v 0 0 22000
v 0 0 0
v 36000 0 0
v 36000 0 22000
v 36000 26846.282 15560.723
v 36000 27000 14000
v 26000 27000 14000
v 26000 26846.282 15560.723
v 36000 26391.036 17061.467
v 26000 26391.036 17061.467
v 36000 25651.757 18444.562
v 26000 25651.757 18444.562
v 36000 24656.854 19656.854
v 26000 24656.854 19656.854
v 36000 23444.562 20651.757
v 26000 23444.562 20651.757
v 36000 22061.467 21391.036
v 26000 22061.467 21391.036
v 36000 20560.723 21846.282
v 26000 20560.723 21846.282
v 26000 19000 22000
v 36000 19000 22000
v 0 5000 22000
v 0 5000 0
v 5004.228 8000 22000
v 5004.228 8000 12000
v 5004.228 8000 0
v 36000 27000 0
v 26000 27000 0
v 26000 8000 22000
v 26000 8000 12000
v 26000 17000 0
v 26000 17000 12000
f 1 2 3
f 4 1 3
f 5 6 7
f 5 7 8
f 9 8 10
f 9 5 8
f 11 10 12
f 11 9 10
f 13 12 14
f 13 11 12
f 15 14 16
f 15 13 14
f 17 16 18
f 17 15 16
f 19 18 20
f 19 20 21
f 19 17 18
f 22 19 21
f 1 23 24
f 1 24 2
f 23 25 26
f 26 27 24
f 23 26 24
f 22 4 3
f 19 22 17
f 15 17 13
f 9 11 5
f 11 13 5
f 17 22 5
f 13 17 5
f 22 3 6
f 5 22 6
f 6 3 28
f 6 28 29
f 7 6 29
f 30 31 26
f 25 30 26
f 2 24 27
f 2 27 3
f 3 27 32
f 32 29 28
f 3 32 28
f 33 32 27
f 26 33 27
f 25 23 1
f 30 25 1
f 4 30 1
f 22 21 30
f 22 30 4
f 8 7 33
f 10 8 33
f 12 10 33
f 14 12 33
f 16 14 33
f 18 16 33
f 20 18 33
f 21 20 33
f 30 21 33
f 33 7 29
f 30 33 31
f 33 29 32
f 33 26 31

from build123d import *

# Parameters (mm, degrees)
BOSS_EXTRUDE1_DEPTH = 22000
CUT_EXTRUDE1_DEPTH  = 22000
BOSS_EXTRUDE2_DEPTH = 12000


with BuildPart() as part:
    # Sketch2 → Boss-Extrude1 (new body)
    with BuildSketch(Plane.XY):
        Polygon((0, 0), (36000, 0), (36000, 27000), (26000, 27000), (26000, 8000), (5004.228184677, 8000), (0, 5000), align=None)
    extrude(amount=BOSS_EXTRUDE1_DEPTH)

    # Sketch3 → Cut-Extrude1 (cut)
    with BuildSketch(Plane(origin=(36000, 0, 0), x_dir=(0, 0, -1), z_dir=(1, 0, 0))):
        with BuildLine():
            Line((-22000, 19000), (-22000, 27000))
            Line((-22000, 27000), (-14000, 27000))
            ThreePointArc((-14000, 27000), (-19656.854249492, 24656.854249492), (-22000, 19000))
        make_face()
    extrude(amount=-CUT_EXTRUDE1_DEPTH, mode=Mode.SUBTRACT)

    # Sketch4 → Boss-Extrude2 (add)
    with BuildSketch(Plane(origin=(0, 0, 0), x_dir=(-1, 0, 0), z_dir=(0, 0, -1))):
        Polygon((-5004.228184677, 8000), (-26000, 8000), (-26000, 17000), align=None)
    extrude(amount=-BOSS_EXTRUDE2_DEPTH)


solid = part.part
